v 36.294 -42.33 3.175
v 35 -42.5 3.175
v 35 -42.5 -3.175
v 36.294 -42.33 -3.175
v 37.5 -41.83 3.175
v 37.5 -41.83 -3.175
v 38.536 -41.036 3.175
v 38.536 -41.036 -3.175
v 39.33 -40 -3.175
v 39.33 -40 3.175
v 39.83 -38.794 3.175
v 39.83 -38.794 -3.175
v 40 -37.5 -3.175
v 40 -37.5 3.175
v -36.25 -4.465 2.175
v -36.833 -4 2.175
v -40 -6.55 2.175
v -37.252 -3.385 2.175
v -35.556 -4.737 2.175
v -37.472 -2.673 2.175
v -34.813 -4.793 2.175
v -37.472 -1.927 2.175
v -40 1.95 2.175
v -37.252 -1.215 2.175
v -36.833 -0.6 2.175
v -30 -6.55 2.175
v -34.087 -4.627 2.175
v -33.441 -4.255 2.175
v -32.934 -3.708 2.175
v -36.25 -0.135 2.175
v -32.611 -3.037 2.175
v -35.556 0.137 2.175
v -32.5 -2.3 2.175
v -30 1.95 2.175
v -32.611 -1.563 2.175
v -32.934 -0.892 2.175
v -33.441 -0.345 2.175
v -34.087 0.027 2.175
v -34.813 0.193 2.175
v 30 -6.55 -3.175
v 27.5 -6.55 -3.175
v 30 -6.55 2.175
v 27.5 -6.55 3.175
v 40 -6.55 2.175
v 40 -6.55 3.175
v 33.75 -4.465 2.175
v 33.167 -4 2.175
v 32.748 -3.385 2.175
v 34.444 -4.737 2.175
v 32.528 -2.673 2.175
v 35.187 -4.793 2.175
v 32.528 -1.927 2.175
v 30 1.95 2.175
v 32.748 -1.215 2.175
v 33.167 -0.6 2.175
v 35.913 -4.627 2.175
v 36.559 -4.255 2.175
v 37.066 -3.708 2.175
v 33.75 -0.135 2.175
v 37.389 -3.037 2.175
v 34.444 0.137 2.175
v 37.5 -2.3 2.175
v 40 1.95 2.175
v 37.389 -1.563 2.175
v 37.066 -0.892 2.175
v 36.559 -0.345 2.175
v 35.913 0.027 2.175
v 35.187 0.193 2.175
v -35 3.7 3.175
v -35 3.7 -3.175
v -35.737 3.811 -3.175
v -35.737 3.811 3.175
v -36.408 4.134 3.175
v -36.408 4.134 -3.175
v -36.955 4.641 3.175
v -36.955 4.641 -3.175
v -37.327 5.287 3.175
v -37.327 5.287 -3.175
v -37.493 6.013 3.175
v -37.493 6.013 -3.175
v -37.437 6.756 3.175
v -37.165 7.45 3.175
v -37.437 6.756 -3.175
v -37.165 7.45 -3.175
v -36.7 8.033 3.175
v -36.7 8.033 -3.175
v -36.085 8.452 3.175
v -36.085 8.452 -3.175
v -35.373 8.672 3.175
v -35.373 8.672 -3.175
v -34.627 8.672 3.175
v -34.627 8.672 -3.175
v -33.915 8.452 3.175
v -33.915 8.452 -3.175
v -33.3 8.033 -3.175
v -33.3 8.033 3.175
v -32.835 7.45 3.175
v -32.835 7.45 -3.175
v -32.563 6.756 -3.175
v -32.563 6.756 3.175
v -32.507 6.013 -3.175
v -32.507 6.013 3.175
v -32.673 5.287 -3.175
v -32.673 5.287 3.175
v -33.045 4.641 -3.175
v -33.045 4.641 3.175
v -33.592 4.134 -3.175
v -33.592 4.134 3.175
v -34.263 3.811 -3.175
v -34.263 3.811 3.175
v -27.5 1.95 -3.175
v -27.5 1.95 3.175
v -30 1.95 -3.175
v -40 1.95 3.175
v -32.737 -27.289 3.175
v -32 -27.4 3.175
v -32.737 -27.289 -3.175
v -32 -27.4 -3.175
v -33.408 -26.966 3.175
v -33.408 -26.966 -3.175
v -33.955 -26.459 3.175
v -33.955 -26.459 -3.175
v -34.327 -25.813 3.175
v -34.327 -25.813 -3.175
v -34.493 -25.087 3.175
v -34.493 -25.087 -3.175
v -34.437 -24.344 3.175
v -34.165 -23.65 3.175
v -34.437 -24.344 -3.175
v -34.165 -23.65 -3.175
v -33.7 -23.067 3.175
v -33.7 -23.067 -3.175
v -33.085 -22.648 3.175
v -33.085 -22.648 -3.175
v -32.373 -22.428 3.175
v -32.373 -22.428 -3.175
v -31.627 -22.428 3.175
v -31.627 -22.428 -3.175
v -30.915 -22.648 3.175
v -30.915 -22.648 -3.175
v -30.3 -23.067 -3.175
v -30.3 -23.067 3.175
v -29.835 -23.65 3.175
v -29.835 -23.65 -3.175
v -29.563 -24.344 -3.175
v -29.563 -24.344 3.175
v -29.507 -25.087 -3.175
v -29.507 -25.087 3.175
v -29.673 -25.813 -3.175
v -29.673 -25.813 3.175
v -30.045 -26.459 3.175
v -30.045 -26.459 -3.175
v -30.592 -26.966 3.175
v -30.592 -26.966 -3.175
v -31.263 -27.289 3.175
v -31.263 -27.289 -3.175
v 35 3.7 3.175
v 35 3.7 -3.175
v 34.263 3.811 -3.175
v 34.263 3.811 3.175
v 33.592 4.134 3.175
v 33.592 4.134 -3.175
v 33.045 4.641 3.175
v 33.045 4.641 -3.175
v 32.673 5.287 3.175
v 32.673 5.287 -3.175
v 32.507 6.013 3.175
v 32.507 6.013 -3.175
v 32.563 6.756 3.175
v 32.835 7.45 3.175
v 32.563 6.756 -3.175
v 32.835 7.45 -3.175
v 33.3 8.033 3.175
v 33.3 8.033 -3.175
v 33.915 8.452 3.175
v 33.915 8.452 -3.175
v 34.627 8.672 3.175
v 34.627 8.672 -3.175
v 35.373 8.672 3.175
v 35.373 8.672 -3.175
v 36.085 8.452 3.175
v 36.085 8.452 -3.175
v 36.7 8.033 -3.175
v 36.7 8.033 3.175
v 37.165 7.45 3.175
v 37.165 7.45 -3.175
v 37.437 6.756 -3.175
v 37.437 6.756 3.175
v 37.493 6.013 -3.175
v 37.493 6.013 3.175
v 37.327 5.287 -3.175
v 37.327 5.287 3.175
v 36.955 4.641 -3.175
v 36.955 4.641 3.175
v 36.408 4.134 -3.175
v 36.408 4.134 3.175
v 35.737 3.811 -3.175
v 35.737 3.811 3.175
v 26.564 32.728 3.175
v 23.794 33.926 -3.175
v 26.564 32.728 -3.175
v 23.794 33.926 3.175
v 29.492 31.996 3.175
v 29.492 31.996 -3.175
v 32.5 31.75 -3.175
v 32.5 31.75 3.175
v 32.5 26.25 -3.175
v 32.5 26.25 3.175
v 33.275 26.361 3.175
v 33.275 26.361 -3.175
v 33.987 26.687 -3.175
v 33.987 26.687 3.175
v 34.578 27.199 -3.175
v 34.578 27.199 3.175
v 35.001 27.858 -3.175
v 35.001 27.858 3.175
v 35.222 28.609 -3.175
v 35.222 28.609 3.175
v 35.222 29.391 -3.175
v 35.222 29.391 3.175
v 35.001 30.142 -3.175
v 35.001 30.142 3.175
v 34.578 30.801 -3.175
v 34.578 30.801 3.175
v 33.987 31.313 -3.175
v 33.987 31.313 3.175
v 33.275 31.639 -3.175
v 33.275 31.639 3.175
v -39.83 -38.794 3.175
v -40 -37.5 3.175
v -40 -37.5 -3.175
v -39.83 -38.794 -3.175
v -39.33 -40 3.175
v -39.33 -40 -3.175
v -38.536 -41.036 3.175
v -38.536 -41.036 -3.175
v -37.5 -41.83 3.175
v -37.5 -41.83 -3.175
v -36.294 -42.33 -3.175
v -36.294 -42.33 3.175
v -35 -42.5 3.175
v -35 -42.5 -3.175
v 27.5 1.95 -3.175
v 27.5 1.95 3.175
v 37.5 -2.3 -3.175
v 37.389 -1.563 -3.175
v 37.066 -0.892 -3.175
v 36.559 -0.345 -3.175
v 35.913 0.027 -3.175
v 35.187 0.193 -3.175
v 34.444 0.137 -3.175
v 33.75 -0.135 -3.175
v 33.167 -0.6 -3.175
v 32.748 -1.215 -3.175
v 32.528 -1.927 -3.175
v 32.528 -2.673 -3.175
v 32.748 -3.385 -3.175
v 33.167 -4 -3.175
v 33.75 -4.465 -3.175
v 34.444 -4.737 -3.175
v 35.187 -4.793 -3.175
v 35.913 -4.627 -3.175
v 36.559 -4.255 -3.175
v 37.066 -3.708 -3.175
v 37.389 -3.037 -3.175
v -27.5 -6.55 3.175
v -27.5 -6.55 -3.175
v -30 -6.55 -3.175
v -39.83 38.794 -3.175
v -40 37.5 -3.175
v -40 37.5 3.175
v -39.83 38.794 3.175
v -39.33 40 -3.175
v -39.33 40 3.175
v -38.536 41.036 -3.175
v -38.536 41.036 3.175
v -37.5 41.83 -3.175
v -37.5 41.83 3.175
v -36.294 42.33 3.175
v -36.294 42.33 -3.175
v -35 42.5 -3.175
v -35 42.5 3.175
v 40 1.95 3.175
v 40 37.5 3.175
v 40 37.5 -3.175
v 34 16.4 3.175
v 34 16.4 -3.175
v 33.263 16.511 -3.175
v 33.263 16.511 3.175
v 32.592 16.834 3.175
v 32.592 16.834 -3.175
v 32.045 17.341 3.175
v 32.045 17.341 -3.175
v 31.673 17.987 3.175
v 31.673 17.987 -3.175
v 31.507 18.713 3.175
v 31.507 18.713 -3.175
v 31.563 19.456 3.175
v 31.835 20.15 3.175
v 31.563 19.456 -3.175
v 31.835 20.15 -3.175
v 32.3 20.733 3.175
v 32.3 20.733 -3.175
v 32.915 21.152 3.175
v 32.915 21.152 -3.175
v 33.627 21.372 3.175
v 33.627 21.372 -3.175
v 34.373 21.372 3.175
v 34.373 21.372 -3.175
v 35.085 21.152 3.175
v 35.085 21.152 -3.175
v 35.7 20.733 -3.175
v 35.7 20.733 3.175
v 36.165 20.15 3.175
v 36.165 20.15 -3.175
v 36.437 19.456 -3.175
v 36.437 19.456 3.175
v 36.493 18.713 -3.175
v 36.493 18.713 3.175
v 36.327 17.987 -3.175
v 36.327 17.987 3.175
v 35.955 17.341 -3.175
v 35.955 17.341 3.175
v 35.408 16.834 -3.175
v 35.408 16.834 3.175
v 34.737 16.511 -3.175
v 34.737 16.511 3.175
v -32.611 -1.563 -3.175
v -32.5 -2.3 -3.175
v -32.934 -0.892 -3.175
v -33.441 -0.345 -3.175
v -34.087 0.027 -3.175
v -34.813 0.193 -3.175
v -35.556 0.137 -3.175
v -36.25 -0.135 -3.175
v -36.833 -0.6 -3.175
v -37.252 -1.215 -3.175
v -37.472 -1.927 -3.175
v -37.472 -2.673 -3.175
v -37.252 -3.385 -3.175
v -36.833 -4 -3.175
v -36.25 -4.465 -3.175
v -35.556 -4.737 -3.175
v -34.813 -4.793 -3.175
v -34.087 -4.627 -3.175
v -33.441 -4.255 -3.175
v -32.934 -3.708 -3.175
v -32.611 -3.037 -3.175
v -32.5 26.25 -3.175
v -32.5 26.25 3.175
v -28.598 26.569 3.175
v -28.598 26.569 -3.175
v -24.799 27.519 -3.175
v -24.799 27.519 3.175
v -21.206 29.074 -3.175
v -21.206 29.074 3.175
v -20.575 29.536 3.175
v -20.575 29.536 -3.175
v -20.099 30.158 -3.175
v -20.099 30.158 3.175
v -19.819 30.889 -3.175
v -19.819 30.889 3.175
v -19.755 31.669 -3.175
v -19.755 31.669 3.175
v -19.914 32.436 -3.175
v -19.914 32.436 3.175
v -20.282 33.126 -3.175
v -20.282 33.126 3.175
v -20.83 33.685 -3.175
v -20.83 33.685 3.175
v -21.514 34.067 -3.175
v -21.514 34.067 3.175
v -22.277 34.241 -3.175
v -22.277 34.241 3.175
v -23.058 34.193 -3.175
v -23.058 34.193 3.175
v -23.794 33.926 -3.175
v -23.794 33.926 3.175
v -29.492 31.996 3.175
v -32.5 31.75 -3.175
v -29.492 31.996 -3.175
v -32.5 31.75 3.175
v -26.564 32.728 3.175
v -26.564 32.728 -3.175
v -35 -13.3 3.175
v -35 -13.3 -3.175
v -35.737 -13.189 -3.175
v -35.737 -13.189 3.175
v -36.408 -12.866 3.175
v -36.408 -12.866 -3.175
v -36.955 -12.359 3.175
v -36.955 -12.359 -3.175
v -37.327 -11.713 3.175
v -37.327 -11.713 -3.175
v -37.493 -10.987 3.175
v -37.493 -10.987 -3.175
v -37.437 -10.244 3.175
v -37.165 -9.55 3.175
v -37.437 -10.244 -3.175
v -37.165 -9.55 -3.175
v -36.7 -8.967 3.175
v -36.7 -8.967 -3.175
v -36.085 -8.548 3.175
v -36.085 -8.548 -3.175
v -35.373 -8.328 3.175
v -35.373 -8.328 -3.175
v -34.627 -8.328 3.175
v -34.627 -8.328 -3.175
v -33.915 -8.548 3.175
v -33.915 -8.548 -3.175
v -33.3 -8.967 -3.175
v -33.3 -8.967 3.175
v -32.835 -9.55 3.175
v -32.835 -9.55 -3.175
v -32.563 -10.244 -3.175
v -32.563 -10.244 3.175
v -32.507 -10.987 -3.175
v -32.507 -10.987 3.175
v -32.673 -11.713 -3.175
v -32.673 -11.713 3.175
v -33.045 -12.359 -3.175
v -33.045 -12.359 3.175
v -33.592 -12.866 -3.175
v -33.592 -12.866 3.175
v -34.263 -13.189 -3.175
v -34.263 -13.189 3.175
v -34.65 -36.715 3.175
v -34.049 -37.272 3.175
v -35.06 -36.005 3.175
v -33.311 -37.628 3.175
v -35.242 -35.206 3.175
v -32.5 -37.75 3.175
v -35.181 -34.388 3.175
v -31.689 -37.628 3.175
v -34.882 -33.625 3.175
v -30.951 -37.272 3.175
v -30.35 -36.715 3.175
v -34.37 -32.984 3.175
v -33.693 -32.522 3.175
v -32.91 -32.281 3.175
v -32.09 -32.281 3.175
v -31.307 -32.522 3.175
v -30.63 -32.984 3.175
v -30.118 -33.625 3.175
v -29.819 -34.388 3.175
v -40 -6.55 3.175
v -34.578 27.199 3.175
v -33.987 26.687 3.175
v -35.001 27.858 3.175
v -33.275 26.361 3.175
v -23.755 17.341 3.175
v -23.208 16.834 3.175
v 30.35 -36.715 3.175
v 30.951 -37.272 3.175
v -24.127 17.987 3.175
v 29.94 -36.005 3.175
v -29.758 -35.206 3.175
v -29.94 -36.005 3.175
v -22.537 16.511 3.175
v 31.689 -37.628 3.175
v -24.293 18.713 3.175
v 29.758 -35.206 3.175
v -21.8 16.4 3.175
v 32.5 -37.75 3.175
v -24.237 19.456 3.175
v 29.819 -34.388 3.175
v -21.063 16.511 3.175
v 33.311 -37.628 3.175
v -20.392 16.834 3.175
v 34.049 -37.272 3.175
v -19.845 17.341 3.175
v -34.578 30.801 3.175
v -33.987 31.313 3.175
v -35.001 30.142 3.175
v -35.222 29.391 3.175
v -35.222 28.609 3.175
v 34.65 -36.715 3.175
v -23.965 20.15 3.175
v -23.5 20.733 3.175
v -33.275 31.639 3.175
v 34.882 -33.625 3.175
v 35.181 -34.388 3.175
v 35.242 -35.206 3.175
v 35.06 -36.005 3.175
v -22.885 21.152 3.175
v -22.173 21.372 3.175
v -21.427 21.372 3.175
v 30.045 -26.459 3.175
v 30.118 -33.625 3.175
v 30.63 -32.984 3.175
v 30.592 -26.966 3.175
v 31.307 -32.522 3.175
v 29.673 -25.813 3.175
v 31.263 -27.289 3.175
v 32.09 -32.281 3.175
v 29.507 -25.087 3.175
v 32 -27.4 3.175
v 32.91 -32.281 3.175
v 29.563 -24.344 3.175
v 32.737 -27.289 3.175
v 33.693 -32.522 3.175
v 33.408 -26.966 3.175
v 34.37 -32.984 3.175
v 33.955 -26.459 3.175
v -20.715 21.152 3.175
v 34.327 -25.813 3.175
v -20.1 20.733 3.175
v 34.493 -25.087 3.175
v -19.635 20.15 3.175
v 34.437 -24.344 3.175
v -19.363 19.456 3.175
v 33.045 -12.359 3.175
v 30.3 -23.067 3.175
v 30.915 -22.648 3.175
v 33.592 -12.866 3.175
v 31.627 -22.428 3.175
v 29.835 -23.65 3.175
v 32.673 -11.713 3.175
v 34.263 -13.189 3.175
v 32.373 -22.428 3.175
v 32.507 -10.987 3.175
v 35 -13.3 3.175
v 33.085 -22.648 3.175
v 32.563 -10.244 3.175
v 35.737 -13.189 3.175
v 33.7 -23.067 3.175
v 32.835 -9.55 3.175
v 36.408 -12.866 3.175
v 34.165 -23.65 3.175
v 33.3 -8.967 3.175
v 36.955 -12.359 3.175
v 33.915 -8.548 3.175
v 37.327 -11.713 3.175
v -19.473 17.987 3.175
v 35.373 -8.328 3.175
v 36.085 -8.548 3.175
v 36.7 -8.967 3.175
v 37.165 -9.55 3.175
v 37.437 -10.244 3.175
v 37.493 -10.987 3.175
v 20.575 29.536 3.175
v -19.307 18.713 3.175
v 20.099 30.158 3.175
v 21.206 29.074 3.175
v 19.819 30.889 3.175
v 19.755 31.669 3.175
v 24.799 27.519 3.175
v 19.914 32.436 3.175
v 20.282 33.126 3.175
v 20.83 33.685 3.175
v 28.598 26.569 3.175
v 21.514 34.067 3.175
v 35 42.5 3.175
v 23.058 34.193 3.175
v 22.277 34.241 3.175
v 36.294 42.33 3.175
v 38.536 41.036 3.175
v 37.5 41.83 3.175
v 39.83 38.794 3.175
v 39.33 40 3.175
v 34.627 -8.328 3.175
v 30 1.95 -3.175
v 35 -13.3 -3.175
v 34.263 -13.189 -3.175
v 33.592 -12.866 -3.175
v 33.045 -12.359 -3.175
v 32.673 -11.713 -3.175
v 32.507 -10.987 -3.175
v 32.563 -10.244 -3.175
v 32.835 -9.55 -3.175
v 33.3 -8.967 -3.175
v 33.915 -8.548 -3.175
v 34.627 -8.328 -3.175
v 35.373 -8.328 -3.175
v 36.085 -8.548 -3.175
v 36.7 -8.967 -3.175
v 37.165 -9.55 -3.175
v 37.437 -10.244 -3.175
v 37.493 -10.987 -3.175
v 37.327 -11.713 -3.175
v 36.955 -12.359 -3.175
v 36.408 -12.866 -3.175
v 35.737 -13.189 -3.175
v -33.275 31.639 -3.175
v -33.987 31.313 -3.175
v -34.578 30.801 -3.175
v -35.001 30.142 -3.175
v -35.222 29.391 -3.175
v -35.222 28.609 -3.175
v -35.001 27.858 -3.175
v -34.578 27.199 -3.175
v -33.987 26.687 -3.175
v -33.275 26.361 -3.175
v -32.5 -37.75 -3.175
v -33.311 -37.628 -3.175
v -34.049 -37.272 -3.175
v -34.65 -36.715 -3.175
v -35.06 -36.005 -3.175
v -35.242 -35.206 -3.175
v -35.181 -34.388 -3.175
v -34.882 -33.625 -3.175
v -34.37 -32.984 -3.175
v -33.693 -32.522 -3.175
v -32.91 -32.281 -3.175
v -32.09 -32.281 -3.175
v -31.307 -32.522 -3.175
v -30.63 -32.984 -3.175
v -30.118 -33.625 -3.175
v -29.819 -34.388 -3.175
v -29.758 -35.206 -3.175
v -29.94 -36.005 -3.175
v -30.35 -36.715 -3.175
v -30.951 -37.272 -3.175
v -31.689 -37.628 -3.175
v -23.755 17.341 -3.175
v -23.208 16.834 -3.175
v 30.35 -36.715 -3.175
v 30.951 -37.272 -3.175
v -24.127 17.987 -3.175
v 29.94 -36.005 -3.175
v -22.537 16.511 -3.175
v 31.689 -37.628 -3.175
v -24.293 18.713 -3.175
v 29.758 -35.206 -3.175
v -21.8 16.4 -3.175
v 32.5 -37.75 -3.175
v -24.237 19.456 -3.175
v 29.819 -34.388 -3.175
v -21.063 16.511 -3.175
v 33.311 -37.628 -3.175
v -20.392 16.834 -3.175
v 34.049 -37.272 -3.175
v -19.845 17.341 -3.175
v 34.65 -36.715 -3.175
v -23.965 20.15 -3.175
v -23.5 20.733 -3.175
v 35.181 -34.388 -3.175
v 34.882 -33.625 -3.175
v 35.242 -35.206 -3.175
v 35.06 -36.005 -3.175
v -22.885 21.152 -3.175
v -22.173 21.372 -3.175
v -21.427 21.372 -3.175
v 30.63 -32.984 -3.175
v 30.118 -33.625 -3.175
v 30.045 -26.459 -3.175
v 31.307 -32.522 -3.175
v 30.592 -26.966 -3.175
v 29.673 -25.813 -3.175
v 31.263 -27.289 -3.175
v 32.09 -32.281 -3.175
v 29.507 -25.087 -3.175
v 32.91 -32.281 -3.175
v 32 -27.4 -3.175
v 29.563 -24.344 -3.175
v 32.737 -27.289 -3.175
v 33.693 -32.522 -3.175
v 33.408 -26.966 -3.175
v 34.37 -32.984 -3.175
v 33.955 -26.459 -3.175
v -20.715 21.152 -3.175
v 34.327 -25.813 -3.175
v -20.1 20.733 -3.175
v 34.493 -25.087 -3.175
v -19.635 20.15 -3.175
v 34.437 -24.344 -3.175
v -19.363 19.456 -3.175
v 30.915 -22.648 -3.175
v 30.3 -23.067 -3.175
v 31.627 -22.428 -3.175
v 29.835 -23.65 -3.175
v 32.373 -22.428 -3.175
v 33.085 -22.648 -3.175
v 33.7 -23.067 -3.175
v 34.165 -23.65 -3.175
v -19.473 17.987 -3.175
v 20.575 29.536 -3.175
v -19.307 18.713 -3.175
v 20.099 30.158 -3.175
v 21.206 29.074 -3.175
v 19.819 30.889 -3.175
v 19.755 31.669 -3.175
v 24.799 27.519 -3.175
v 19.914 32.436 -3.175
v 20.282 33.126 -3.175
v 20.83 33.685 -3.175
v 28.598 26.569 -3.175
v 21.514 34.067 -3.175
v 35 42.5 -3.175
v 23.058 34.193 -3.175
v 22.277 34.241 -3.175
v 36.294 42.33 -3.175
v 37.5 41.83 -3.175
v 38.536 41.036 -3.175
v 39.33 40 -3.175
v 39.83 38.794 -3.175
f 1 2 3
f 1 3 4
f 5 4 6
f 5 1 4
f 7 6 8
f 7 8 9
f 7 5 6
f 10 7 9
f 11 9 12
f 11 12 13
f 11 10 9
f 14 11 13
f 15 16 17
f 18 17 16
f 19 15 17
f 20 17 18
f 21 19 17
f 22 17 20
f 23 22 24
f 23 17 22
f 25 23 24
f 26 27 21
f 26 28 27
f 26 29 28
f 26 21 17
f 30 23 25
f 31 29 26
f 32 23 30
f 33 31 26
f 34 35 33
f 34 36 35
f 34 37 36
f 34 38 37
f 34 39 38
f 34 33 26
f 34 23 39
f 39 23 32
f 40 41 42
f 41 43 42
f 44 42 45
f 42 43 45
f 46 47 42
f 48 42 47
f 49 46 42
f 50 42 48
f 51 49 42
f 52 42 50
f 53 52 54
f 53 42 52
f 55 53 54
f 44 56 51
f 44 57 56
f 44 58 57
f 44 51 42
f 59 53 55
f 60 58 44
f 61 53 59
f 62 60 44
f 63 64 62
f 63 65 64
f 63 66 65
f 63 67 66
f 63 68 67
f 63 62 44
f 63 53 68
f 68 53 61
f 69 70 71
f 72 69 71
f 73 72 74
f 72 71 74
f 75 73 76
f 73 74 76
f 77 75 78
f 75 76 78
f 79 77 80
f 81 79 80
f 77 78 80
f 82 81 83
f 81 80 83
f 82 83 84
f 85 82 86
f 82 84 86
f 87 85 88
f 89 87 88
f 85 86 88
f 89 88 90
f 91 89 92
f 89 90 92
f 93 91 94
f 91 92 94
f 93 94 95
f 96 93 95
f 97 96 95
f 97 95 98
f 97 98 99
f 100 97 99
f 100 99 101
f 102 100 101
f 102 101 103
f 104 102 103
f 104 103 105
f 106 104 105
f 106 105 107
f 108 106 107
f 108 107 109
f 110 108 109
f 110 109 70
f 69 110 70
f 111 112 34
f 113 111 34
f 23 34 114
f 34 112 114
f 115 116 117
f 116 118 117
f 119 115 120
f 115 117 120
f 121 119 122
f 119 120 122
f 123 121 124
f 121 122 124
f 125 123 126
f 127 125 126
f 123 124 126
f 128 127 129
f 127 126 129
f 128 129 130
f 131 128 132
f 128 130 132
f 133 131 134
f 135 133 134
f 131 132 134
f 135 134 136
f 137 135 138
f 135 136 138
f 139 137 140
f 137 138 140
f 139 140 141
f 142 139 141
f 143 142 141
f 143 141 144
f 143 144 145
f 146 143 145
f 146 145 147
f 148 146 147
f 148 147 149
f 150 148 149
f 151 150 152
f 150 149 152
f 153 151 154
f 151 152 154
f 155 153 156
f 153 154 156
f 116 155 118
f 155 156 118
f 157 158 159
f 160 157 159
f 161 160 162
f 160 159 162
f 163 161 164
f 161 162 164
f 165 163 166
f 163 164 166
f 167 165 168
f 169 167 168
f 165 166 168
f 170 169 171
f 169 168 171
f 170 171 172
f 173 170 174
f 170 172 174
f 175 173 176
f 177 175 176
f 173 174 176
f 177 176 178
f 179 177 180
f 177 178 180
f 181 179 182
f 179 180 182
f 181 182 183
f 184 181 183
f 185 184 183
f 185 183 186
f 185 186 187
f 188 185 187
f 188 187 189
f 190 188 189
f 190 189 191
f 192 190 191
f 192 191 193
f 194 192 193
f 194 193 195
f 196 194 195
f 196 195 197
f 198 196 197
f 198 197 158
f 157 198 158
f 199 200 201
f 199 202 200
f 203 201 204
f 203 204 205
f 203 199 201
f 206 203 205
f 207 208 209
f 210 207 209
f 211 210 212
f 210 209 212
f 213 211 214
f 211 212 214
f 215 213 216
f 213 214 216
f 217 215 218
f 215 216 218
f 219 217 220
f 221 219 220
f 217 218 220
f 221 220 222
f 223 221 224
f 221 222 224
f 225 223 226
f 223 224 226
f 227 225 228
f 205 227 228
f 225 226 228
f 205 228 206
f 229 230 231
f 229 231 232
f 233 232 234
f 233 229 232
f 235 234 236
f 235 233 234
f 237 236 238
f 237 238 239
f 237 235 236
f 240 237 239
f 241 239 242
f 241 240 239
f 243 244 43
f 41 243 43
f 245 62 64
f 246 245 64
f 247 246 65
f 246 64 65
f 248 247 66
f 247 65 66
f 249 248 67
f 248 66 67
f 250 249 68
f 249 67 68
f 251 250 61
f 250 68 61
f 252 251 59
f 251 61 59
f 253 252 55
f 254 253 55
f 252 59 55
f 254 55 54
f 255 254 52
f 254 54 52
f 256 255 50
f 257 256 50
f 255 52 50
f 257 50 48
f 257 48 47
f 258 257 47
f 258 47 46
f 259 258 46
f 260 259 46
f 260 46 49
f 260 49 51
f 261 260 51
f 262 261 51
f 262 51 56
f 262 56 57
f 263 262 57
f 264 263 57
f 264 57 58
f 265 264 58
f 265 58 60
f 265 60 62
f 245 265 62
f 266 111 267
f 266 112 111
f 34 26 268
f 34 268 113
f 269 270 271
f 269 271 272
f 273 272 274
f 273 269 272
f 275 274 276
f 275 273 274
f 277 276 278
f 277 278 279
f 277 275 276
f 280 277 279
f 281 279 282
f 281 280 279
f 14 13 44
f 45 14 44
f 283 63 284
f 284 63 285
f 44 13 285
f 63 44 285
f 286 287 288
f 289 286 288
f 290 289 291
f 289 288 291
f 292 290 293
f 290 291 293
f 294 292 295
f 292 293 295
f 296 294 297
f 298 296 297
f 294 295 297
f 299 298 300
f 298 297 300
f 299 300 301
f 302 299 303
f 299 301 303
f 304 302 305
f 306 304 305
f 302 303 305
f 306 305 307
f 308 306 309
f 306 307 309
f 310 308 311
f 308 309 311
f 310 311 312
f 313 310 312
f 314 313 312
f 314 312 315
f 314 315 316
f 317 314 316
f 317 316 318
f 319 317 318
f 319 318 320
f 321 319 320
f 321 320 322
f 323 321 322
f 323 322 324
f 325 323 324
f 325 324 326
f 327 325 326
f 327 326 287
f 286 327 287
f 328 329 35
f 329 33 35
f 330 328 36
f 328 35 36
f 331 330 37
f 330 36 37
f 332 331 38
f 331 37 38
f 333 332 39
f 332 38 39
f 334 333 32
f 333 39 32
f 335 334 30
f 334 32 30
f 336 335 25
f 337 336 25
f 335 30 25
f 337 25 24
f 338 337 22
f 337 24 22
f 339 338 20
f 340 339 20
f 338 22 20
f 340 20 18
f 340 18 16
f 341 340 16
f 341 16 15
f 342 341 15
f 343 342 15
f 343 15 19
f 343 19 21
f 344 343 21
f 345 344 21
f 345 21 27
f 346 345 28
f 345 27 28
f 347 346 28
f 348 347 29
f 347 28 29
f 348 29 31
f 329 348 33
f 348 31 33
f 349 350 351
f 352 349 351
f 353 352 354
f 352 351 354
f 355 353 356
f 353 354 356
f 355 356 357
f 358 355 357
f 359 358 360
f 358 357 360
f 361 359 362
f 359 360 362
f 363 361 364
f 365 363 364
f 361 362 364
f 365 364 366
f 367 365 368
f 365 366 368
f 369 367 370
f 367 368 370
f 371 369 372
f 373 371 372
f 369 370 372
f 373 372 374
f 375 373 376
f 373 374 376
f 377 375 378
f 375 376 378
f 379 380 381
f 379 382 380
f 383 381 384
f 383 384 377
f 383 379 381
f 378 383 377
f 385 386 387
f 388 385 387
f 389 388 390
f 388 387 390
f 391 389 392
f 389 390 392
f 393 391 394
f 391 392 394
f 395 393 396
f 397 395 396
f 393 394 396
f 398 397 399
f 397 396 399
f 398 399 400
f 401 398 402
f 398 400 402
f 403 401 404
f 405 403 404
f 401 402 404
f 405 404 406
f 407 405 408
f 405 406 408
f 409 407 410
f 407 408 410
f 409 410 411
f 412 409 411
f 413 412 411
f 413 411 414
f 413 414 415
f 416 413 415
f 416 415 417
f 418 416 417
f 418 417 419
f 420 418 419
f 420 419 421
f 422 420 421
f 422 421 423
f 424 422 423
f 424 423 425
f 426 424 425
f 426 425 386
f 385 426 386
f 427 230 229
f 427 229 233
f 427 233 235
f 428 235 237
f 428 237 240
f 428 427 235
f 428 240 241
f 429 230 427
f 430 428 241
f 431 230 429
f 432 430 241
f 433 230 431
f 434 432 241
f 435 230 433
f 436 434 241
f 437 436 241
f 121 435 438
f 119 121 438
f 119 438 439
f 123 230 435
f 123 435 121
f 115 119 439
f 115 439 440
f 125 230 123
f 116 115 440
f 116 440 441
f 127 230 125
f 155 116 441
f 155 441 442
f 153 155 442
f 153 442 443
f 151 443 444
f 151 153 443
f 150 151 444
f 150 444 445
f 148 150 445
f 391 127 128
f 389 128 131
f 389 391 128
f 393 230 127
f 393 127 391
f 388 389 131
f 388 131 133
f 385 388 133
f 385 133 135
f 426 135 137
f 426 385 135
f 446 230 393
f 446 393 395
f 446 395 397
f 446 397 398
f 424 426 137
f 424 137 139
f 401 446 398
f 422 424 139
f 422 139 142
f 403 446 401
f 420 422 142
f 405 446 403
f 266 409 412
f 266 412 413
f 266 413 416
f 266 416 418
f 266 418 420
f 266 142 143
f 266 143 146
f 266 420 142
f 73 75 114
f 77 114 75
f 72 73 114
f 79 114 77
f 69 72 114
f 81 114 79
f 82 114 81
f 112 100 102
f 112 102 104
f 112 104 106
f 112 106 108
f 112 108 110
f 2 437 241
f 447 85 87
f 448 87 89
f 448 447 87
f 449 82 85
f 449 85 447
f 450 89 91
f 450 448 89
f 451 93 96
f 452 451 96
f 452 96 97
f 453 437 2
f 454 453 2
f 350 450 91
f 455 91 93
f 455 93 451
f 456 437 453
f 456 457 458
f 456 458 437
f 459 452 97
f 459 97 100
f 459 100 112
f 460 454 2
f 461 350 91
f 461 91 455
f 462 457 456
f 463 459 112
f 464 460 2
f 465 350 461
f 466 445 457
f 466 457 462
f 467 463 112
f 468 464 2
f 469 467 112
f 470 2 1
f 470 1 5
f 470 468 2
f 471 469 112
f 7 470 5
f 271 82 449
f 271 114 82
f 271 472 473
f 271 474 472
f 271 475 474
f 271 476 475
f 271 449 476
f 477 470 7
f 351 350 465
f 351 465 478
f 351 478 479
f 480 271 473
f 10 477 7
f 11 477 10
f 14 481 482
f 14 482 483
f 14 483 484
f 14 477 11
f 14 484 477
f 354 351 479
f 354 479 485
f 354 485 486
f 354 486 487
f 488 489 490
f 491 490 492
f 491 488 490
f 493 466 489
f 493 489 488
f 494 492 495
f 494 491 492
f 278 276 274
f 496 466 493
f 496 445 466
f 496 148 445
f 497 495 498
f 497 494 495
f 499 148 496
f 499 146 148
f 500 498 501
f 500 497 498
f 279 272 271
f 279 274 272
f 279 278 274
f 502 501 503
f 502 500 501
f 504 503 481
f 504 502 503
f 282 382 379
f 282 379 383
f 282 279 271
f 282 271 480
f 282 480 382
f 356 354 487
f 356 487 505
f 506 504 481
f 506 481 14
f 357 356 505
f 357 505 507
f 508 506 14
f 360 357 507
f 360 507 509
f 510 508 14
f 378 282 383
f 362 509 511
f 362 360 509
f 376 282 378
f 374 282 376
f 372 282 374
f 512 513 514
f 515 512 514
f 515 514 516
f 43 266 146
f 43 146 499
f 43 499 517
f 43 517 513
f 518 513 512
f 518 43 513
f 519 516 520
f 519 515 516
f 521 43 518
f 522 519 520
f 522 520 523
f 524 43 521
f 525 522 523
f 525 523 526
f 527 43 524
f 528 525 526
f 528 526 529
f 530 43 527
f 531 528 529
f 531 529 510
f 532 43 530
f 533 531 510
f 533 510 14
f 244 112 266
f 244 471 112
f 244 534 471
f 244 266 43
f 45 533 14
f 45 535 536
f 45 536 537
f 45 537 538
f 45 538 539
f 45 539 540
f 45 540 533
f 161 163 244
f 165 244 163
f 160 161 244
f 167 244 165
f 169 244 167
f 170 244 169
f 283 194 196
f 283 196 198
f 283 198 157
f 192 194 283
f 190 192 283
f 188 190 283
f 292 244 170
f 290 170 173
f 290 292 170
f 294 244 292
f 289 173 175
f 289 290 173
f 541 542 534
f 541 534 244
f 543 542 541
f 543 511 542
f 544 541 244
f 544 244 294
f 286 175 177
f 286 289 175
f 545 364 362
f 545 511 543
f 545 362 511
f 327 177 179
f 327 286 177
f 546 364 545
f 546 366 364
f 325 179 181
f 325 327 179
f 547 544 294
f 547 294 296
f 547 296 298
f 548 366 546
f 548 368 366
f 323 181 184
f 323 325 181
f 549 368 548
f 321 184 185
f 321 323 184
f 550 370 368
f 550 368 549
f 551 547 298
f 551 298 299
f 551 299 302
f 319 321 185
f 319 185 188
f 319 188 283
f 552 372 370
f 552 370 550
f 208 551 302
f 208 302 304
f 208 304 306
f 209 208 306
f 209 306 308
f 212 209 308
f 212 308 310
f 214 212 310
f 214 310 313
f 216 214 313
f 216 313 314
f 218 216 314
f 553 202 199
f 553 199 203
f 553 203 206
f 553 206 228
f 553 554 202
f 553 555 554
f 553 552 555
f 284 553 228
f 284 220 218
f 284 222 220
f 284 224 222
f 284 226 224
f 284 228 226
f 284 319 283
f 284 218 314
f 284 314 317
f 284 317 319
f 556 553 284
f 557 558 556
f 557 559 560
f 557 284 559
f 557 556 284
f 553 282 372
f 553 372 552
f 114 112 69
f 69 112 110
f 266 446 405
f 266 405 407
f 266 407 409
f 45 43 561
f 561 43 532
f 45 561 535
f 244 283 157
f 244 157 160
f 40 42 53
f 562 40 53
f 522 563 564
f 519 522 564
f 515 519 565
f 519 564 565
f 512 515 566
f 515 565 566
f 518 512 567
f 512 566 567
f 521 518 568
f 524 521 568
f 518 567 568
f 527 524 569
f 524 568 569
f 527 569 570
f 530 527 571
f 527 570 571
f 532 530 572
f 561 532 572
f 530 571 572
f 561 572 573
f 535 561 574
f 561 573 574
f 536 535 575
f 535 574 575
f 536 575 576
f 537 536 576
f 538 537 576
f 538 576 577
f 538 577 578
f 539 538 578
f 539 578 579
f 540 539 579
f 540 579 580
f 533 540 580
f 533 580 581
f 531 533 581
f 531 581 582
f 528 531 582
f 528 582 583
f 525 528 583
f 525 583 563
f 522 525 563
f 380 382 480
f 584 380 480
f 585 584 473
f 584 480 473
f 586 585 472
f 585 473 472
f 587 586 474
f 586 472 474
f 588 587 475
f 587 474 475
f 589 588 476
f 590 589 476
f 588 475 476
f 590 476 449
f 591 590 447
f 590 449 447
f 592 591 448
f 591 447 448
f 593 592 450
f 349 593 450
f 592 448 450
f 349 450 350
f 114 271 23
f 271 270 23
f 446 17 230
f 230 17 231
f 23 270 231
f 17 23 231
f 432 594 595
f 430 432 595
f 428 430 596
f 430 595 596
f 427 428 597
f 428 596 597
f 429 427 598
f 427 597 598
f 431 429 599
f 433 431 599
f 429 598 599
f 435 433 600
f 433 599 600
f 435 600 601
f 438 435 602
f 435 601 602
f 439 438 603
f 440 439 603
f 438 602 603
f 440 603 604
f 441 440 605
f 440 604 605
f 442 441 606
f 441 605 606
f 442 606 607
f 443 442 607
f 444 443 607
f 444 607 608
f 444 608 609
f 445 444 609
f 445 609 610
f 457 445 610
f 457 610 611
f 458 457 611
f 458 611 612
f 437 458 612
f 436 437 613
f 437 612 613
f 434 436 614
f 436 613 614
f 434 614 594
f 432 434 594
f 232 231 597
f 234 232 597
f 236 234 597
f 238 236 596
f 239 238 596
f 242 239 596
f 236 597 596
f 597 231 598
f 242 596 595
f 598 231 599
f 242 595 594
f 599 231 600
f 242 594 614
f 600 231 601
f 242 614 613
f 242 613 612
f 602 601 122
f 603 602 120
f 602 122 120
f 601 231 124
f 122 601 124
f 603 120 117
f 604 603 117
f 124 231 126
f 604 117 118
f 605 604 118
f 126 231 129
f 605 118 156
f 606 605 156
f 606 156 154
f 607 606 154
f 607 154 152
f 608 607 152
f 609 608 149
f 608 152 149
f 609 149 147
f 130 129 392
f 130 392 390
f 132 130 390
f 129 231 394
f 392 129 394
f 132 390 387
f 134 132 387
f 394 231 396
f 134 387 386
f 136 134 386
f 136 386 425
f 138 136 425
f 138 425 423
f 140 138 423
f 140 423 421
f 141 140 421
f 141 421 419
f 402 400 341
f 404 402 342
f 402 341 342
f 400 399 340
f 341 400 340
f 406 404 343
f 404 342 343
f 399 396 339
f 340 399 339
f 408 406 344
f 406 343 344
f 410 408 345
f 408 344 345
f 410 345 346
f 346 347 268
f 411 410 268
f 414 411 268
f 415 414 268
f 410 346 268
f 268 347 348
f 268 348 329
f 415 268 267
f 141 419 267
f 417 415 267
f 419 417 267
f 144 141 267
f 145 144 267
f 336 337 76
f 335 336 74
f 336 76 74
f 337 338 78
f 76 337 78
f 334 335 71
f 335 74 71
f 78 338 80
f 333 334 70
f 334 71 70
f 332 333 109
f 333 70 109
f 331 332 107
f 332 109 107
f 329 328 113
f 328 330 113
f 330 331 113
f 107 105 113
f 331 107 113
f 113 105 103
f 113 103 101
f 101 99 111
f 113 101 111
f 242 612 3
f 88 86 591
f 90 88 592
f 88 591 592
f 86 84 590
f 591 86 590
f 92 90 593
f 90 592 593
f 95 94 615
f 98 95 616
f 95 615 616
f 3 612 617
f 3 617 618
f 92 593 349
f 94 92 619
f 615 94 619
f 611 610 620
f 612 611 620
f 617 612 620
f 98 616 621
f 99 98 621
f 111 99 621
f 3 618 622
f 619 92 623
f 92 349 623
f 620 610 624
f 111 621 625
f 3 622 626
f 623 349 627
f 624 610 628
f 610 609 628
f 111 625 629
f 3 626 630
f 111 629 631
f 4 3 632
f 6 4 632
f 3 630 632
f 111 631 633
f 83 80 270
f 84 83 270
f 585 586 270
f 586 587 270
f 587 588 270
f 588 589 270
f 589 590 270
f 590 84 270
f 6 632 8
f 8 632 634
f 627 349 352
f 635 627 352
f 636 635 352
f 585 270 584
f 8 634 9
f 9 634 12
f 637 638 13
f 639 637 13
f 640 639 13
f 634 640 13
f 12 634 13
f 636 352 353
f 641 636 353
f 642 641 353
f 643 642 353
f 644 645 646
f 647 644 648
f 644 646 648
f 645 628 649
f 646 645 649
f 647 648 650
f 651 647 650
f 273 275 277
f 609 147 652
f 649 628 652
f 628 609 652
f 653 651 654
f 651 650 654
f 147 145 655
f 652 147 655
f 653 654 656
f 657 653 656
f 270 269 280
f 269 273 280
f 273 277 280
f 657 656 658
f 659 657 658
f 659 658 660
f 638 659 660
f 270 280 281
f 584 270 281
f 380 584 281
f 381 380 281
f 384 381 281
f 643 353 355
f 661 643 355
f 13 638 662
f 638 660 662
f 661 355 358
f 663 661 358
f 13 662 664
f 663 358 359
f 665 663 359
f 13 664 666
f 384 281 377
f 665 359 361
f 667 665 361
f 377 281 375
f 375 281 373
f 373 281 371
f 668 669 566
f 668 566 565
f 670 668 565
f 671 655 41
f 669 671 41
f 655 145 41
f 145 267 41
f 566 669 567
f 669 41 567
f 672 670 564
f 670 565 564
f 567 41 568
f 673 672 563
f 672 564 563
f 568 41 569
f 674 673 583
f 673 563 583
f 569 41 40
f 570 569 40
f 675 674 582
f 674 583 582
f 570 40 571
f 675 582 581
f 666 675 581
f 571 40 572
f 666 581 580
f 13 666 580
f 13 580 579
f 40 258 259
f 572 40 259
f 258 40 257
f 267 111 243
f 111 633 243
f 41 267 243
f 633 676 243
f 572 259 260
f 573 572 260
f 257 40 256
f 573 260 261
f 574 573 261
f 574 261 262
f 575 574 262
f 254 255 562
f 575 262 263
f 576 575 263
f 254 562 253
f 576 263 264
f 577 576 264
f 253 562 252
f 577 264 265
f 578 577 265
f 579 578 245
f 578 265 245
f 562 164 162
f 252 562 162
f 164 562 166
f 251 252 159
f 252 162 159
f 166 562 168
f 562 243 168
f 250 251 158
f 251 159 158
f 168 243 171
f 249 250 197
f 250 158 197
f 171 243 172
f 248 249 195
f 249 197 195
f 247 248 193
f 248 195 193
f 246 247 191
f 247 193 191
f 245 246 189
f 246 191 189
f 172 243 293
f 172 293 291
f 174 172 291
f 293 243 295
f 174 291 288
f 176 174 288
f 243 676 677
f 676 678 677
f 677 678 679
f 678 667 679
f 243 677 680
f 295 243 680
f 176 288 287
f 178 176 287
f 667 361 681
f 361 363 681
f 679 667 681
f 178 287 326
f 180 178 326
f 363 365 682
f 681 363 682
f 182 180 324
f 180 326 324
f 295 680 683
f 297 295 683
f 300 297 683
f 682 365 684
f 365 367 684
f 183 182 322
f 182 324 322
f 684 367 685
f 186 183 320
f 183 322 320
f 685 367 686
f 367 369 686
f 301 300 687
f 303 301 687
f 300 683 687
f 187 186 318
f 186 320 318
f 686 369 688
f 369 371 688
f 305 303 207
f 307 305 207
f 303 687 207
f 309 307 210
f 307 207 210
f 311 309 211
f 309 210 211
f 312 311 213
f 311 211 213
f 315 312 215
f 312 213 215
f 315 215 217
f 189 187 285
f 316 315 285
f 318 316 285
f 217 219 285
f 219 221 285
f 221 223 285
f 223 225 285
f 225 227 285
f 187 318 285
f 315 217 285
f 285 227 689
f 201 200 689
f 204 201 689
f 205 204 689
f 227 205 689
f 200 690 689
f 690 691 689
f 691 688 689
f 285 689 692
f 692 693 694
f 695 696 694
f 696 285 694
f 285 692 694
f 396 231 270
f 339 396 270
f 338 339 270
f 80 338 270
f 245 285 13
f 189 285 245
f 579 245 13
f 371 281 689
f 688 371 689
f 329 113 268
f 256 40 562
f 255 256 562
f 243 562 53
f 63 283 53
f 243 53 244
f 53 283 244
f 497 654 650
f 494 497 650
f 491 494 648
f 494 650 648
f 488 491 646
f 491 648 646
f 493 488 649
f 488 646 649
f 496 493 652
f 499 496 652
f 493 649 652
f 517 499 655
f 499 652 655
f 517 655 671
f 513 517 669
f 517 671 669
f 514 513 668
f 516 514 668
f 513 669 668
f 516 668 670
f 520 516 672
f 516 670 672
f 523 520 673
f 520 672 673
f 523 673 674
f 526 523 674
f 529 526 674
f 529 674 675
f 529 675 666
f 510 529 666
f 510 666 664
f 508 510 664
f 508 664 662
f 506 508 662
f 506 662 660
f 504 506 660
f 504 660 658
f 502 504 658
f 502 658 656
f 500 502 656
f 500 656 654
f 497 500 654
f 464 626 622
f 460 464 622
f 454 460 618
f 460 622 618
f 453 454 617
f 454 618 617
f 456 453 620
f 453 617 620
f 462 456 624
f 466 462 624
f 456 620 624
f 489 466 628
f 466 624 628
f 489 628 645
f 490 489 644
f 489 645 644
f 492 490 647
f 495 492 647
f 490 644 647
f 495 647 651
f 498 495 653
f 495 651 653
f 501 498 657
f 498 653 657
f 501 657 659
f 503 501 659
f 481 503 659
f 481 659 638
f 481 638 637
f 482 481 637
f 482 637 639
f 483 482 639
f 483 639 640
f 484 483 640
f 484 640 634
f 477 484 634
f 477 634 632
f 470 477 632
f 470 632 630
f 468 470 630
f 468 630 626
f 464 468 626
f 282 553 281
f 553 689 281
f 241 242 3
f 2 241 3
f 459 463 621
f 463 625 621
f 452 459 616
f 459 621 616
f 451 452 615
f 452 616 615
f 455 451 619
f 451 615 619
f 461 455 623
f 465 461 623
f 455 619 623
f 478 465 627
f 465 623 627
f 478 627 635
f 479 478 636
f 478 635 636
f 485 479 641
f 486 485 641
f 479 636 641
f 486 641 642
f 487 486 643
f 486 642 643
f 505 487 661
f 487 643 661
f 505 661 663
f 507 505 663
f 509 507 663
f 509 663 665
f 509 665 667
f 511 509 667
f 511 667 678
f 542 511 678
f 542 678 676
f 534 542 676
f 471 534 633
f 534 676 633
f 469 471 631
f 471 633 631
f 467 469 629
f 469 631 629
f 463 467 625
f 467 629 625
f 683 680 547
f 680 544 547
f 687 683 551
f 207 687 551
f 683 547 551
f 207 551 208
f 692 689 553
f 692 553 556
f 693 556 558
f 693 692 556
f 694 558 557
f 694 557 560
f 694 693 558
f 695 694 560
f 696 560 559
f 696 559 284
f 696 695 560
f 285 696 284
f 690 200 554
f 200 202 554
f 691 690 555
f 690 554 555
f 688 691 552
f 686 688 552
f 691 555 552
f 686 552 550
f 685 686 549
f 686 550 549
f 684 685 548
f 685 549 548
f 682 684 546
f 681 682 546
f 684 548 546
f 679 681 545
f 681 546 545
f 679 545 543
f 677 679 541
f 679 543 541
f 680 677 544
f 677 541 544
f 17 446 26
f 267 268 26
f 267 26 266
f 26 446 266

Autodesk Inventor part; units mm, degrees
ref_plane "YZ Plane" through (0, 0, 0) normal (1, 0, 0) x (0, 1, 0)
ref_plane "XZ Plane" through (0, 0, 0) normal (0, 1, 0) x (-1, 0, 0)
ref_plane "XY Plane" through (0, 0, 0) normal (0, 0, 1) x (1, 0, 0)
sketch "Sketch1" plane through (0, 0, 0) normal (0, 0, 1) x (1, 0, 0)
  line L0 (-40, -42.5) -> (40, -42.5)
  line L1 (40, -42.5) -> (40, 42.5)
  line L2 (40, 42.5) -> (-40, 42.5)
  line L3 (-40, 42.5) -> (-40, -42.5)
  line L4 (-40, -42.5) -> (40, 42.5) construction
  line L5 (40, -42.5) -> (-40, 42.5) construction
  line L6 (-28.7479, 32.175) -> (28.7479, 32.175) construction
  line L7 (28.7479, 32.175) -> (28.7479, -32.175) construction
  line L8 (28.7479, -32.175) -> (-28.7479, -32.175) construction
  line L9 (-28.7479, -32.175) -> (-28.7479, 32.175) construction
  line L10 (-28.7479, 32.175) -> (28.7479, -32.175) construction
  line L11 (28.7479, 32.175) -> (-28.7479, -32.175) construction
  circle A0 centre (28.7479, -32.175) radius 2.5 construction
  circle A1 centre (-28.7479, -32.175) radius 2.5 construction
  arc A2 (-28.7479, 32.175) -> (-13.7479, 34.175) centre (-28.7479, 89.425) ccw construction
  arc A3 (-28.7479, 29.675) -> (-13.0929, 31.7623) centre (-28.7479, 89.425) ccw construction
  arc A4 (-28.7479, 34.675) -> (-14.403, 36.5877) centre (-28.7479, 89.425) ccw construction
  arc A5 (-28.7479, 34.675) -> (-28.7479, 29.675) centre (-28.7479, 32.175) ccw construction
  arc A6 (-13.0929, 31.7623) -> (-14.403, 36.5877) centre (-13.7479, 34.175) ccw construction
  point P0 (0, 0)
  dimension "d0" = 80
  dimension "d1" = 64.35
  dimension "d2" = 5
  dimension "d3" = 5
  dimension "d4" = 5
  dimension "d5" = 2
  dimension "d6" = 15
  dimension "d7" = 85
extrude "Extrusion1" add sketch "Sketch1" along normal mid plane 6.35
sketch "Sketch2" plane through (0, 0, 3.175) normal (0, 0, 1) x (1, 0, 0)
  line L0 (-40, -42.5) -> (40, -42.5) projected
  line L1 (-40, 42.5) -> (-40, -42.5) projected
  line L2 (40, -42.5) -> (40, 42.5) projected
  point P0 (0, 0)
  point P1 (-32.5, -35)
  point P2 (32.5, -35)
  dimension "d11" = 7.5
  dimension "d12" = 7.5
  dimension "d13" = 7.5
hole "Hole1" at (-32.5, -35, 3.175) at (32.5, -35, 3.175) direction (0, 0, -1) diameter 5.5 end through all clearance for "Flat Head Machine Screw" size "M5" standard "Ansi Metric M Profile"
sketch "Sketch3" plane through (0, 0, 3.175) normal (0, 0, 1) x (1, 0, 0)
  circle A0 centre (-32.5, -35) radius 2.75 projected
  circle A1 centre (32.5, -35) radius 2.75 projected
  arc A2 (-32.5, 29) -> (-22.5, 31.5) centre (-32.5, 50.25) ccw construction
  arc A3 (-32.5, 26.25) -> (-21.2059, 29.0735) centre (-32.5, 50.25) ccw
  arc A4 (-32.5, 31.75) -> (-23.7941, 33.9265) centre (-32.5, 50.25) ccw
  arc A5 (-32.5, 31.75) -> (-32.5, 26.25) centre (-32.5, 29) ccw
  arc A6 (-21.2059, 29.0735) -> (-23.7941, 33.9265) centre (-22.5, 31.5) ccw
  line L0 (0, 0) -> (0, 8.7533)
  arc A7 (22.5, 31.5) -> (32.5, 29) centre (32.5, 50.25) ccw construction
  arc A8 (21.2059, 29.0735) -> (32.5, 26.25) centre (32.5, 50.25) ccw
  arc A9 (23.7941, 33.9265) -> (32.5, 31.75) centre (32.5, 50.25) ccw
  arc A10 (32.5, 26.25) -> (32.5, 31.75) centre (32.5, 29) ccw
  arc A11 (23.7941, 33.9265) -> (21.2059, 29.0735) centre (22.5, 31.5) ccw
  dimension "d21" = 64
  dimension "d22" = 2.5
  dimension "d23" = 10
  dimension "d24" = 2.75
extrude "Extrusion2" cut sketch "Sketch3" against normal blind 10 contours A5 A4 A6 A3 | A11 A9 A10 A8
fillet "Fillet1" radius 5 4 edges at (-40, 42.5, 0) (-40, -42.5, 0) (40, 42.5, 0) (40, -42.5, 0)
sketch "Sketch5" plane through (0, 0, 3.175) normal (0, 0, 1) x (1, 0, 0)
  line L0 (-35, 1.95) -> (-32.5, 1.95)
  line L1 (-32.5, 1.95) -> (-32.5, -6.55)
  line L2 (-32.5, -6.55) -> (-35, -6.55)
  line L3 (-35, -6.55) -> (-35, 1.95)
  line L4 (-35, 1.95) -> (-32.5, -6.55) construction
  line L5 (-32.5, 1.95) -> (-35, -6.55) construction
  line L6 (-35, -42.5) -> (35, -42.5) projected
  line L7 (-40, 37.5) -> (-40, -37.5) projected
  line L8 (0, 0) -> (0, 7.9941)
  line L9 (35, 1.95) -> (32.5, 1.95)
  line L10 (32.5, 1.95) -> (32.5, -6.55)
  line L11 (32.5, -6.55) -> (35, -6.55)
  line L12 (35, -6.55) -> (35, 1.95)
  line L13 (35, 1.95) -> (32.5, -6.55) construction
  line L14 (32.5, 1.95) -> (35, -6.55) construction
  line L15 (-38, -2.3) -> (-40, -3.4547)
  line L16 (-40, -3.4547) -> (-40, -1.1453)
  line L17 (-40, -1.1453) -> (-38, -2.3)
  line L18 (38, -2.3) -> (40, -3.4547)
  line L19 (40, -3.4547) -> (40, -1.1453)
  line L20 (40, -1.1453) -> (38, -2.3)
  line L21 (-30, 1.95) -> (-27.5, 1.95)
  line L22 (-27.5, 1.95) -> (-27.5, -6.55)
  line L23 (-27.5, -6.55) -> (-30, -6.55)
  line L24 (-30, -6.55) -> (-30, 1.95)
  line L25 (-30, 1.95) -> (-27.5, -6.55) construction
  line L26 (-27.5, 1.95) -> (-30, -6.55) construction
  line L27 (30, 1.95) -> (27.5, 1.95)
  line L28 (27.5, 1.95) -> (27.5, -6.55)
  line L29 (27.5, -6.55) -> (30, -6.55)
  line L30 (30, -6.55) -> (30, 1.95)
  line L31 (30, 1.95) -> (27.5, -6.55) construction
  line L32 (27.5, 1.95) -> (30, -6.55) construction
  line L33 (-22.5, 1.95) -> (-20, 1.95)
  line L34 (-20, 1.95) -> (-20, -6.55)
  line L35 (-20, -6.55) -> (-22.5, -6.55)
  line L36 (-22.5, -6.55) -> (-22.5, 1.95)
  line L37 (-22.5, 1.95) -> (-20, -6.55) construction
  line L38 (-20, 1.95) -> (-22.5, -6.55) construction
  line L39 (20, 1.95) -> (22.5, 1.95)
  line L40 (22.5, 1.95) -> (22.5, -6.55)
  line L41 (22.5, -6.55) -> (20, -6.55)
  line L42 (20, -6.55) -> (20, 1.95)
  line L43 (20, 1.95) -> (22.5, -6.55) construction
  line L44 (22.5, 1.95) -> (20, -6.55) construction
  point P0 (-33.75, -2.3)
  point P1 (33.75, -2.3)
  point P2 (-39.3333, -2.3)
  point P3 (-33.75, -2.3)
  point P4 (39.3333, -2.3)
  point P5 (-40, -1.1453)
  point P6 (-28.75, -2.3)
  point P7 (-28.75, -2.3)
  point P8 (-33.75, -2.3)
  point P9 (28.75, -2.3)
  point P10 (28.75, -2.3)
  point P11 (-21.25, -2.3)
  point P12 (21.25, -2.3)
  dimension "d40" = 2.5
  dimension "d41" = 8.5
  dimension "d42" = 40.2
  dimension "d46" = 2
  dimension "d51" = 5
  dimension "d52" = 5
  dimension "d53" = 5
  dimension "d69" = 10
extrude "Extrusion3" cut sketch "Sketch5" against normal blind 10 contours L21 L22 L23 L24 | L30 L29 L28 L27
sketch "Sketch7" plane through (0, 0, 3.175) normal (0, 0, 1) x (1, 0, 0)
  line L0 (30, 1.95) -> (30, -6.55) projected
  line L1 (30, -6.55) -> (27.5, -6.55) projected
  line L2 (27.5, -6.55) -> (27.5, 1.95) projected
  line L3 (27.5, 1.95) -> (30, 1.95) projected
  line L4 (-27.5, 1.95) -> (-27.5, -6.55) projected
  line L5 (-27.5, -6.55) -> (-30, -6.55) projected
  line L6 (-30, -6.55) -> (-30, 1.95) projected
  line L7 (-30, 1.95) -> (-27.5, 1.95) projected
  arc A0 (35, -42.5) -> (40, -37.5) centre (35, -37.5) ccw projected
  line L8 (40, -37.5) -> (40, 37.5) projected
  arc A1 (40, 37.5) -> (35, 42.5) centre (35, 37.5) ccw projected
  line L9 (35, 42.5) -> (-35, 42.5) projected
  arc A2 (-35, 42.5) -> (-40, 37.5) centre (-35, 37.5) ccw projected
  line L10 (-40, 37.5) -> (-40, -37.5) projected
  arc A3 (-40, -37.5) -> (-35, -42.5) centre (-35, -37.5) ccw projected
  line L11 (-35, -42.5) -> (35, -42.5) projected
  arc A4 (23.7941, 33.9265) -> (32.5, 31.75) centre (32.5, 50.25) ccw projected
  arc A5 (32.5, 26.25) -> (32.5, 31.75) centre (32.5, 29) ccw projected
  arc A6 (21.2059, 29.0735) -> (32.5, 26.25) centre (32.5, 50.25) ccw projected
  arc A7 (23.7941, 33.9265) -> (21.2059, 29.0735) centre (22.5, 31.5) ccw projected
  arc A8 (-32.5, 26.25) -> (-21.2059, 29.0735) centre (-32.5, 50.25) ccw projected
  arc A9 (-32.5, 31.75) -> (-32.5, 26.25) centre (-32.5, 29) ccw projected
  arc A10 (-32.5, 31.75) -> (-23.7941, 33.9265) centre (-32.5, 50.25) ccw projected
  arc A11 (-21.2059, 29.0735) -> (-23.7941, 33.9265) centre (-22.5, 31.5) ccw projected
  circle A12 centre (-32.5, -35) radius 2.75 projected
  circle A13 centre (32.5, -35) radius 2.75 projected
  line L12 (-30, 1.95) -> (-27.5, 1.95) projected
  line L13 (-30, 1.95) -> (-40, 1.95)
  line L14 (-40, 1.95) -> (-40, -6.55)
  line L15 (-40, -6.55) -> (-30, -6.55)
  line L16 (-30, -6.55) -> (-30, 1.95)
  line L17 (30, -6.55) -> (30, 1.95) projected
  line L18 (30, 1.95) -> (40, 1.95)
  line L19 (40, 1.95) -> (40, -6.55)
  line L20 (40, -6.55) -> (30, -6.55)
  line L21 (30, -6.55) -> (30, 1.95)
  point P0 (0, 0)
extrude "Extrusion5" cut sketch "Sketch7" against normal blind 1 contours L18 L8 L20 L0 | L13 L6 L15 L10
sketch "Sketch8" plane through (0, 0, 3.175) normal (0, 0, 1) x (1, 0, 0)
  line L0 (-40, 1.95) -> (-30, 1.95) projected
  line L1 (-40, -6.55) -> (-40, 1.95) projected
  line L2 (-30, -6.55) -> (-40, -6.55) projected
  line L3 (-30, 1.95) -> (-30, -6.55) projected
  line L4 (30, 1.95) -> (40, 1.95) projected
  line L5 (30, -6.55) -> (30, 1.95) projected
  line L6 (40, -6.55) -> (30, -6.55) projected
  line L7 (40, 1.95) -> (40, -6.55) projected
  circle A0 centre (-35, -2.3) radius 2.5
  circle A1 centre (35, -2.3) radius 2.5
  point P0 (0, 0)
  point P1 (-35, 1.95)
  point P2 (-30, -2.3)
  point P3 (30, -2.3)
  point P4 (35, 1.95)
  dimension "d56" = 5
  dimension "d57" = 5
extrude "Extrusion6" cut sketch "Sketch8" against normal blind 10 contours A0 | A1
sketch "Sketch9" plane through (0, 0, 3.175) normal (0, 0, 1) x (1, 0, 0)
  circle A0 centre (32.5, -35) radius 2.75 projected
  circle A1 centre (-32.5, -35) radius 2.75 projected
  arc A2 (-32.5, 26.25) -> (-21.2059, 29.0735) centre (-32.5, 50.25) ccw projected
  arc A3 (-32.5, 31.75) -> (-32.5, 26.25) centre (-32.5, 29) ccw projected
  arc A4 (-32.5, 31.75) -> (-23.7941, 33.9265) centre (-32.5, 50.25) ccw projected
  arc A5 (-21.2059, 29.0735) -> (-23.7941, 33.9265) centre (-22.5, 31.5) ccw projected
  arc A6 (23.7941, 33.9265) -> (32.5, 31.75) centre (32.5, 50.25) ccw projected
  arc A7 (32.5, 26.25) -> (32.5, 31.75) centre (32.5, 29) ccw projected
  arc A8 (21.2059, 29.0735) -> (32.5, 26.25) centre (32.5, 50.25) ccw projected
  arc A9 (23.7941, 33.9265) -> (21.2059, 29.0735) centre (22.5, 31.5) ccw projected
  line L0 (27.5, 1.95) -> (40, 1.95) projected
  line L1 (40, 1.95) -> (40, 37.5) projected
  arc A10 (40, 37.5) -> (35, 42.5) centre (35, 37.5) ccw projected
  line L2 (35, 42.5) -> (-35, 42.5) projected
  arc A11 (-35, 42.5) -> (-40, 37.5) centre (-35, 37.5) ccw projected
  line L3 (-40, 37.5) -> (-40, 1.95) projected
  line L4 (-40, 1.95) -> (-27.5, 1.95) projected
  line L5 (-27.5, 1.95) -> (-27.5, -6.55) projected
  line L6 (-27.5, -6.55) -> (-40, -6.55) projected
  line L7 (-40, -6.55) -> (-40, -37.5) projected
  arc A12 (-40, -37.5) -> (-35, -42.5) centre (-35, -37.5) ccw projected
  line L8 (-35, -42.5) -> (35, -42.5) projected
  arc A13 (35, -42.5) -> (40, -37.5) centre (35, -37.5) ccw projected
  line L9 (40, -37.5) -> (40, -6.55) projected
  line L10 (40, -6.55) -> (27.5, -6.55) projected
  line L11 (27.5, -6.55) -> (27.5, 1.95) projected
  circle A14 centre (-35, -2.3) radius 2.5 projected
  circle A15 centre (35, -2.3) radius 2.5 projected
  point P0 (0, 0)
  point P1 (-35, 6.2)
  point P2 (-35, -10.8)
  point P3 (35, -10.8)
  point P4 (35, 6.2)
  dimension "d60" = 17
  dimension "d61" = 8.5
hole "Hole3" at (-35, 6.2, 3.175) at (-35, -10.8, 3.175) at (35, -10.8, 3.175) at (35, 6.2, 3.175) direction (0, 0, -1) diameter 5 depth 28.25 tip angle 118
sketch "Sketch10" plane through (0, 0, 3.175) normal (0, 0, 1) x (1, 0, 0)
  line L0 (-20, 20) -> (20, 20) construction
  line L1 (20, 20) -> (20, -20) construction
  line L2 (20, -20) -> (-20, -20) construction
  line L3 (-20, -20) -> (-20, 20) construction
  line L4 (-20, 20) -> (20, -20) construction
  line L5 (20, 20) -> (-20, -20) construction
  line L6 (-10, 31.25) -> (10, 31.25) construction
  line L7 (35, 42.5) -> (-35, 42.5) construction
  line L8 (-10, -31.25) -> (10, -31.25) construction
  line L9 (-32, 18.9) -> (32, 18.9) construction
  line L10 (32, 18.9) -> (32, -24.9) construction
  line L11 (32, -24.9) -> (-32, -24.9) construction
  line L12 (-32, -24.9) -> (-32, 18.9) construction
  line L13 (-32, 18.9) -> (32, -24.9) construction
  line L14 (32, 18.9) -> (-32, -24.9) construction
  point P0 (0, 0)
  point P1 (0, 31.25)
  point P2 (0, 0)
  point P3 (0, -31.25)
  point P4 (0, 0)
  point P5 (0, -3)
  point P6 (0, -3)
  point P7 (34, 18.9)
  point P8 (-21.8, 18.9)
  dimension "d70" = 40
  dimension "d71" = 40
  dimension "d72" = 20
  dimension "d73" = 11.25
  dimension "d74" = 11.25
  dimension "d75" = 11.25
  dimension "d83" = 64
  dimension "d84" = 43.8
  dimension "d85" = 24.9
  dimension "d86" = 2
  dimension "d87" = 10.2
hole "Hole4" at (-21.8, 18.9, 3.175) at (34, 18.9, 3.175) at (32, -24.9, 3.175) at (-32, -24.9, 3.175) direction (0, 0, -1) diameter 5 end through all
sketch "Sketch11" plane through (0, 0, 3.175) normal (0, 0, 1) x (1, 0, 0)
  line L0 (-29.6544, 25.4909) -> (-13.6801, 25.4909)
  line L1 (-13.6801, 25.4909) -> (-13.6801, 10.7062)
  line L2 (-13.6801, 10.7062) -> (-29.6544, 10.7062)
  line L3 (-29.6544, 10.7062) -> (-29.6544, 25.4909)
  point P0 (0, 0)
extrude "Extrusion7" [suppressed]
equation "\"d52\" = d51"
equation "\"d53\" = d52"
equation "\"d61\" = 0.5 * d60"
equation "\"d74\" = d73"
equation "\"d75\" = d73"
properties part number "x carraige plate new" material "PMMA Plastic"
